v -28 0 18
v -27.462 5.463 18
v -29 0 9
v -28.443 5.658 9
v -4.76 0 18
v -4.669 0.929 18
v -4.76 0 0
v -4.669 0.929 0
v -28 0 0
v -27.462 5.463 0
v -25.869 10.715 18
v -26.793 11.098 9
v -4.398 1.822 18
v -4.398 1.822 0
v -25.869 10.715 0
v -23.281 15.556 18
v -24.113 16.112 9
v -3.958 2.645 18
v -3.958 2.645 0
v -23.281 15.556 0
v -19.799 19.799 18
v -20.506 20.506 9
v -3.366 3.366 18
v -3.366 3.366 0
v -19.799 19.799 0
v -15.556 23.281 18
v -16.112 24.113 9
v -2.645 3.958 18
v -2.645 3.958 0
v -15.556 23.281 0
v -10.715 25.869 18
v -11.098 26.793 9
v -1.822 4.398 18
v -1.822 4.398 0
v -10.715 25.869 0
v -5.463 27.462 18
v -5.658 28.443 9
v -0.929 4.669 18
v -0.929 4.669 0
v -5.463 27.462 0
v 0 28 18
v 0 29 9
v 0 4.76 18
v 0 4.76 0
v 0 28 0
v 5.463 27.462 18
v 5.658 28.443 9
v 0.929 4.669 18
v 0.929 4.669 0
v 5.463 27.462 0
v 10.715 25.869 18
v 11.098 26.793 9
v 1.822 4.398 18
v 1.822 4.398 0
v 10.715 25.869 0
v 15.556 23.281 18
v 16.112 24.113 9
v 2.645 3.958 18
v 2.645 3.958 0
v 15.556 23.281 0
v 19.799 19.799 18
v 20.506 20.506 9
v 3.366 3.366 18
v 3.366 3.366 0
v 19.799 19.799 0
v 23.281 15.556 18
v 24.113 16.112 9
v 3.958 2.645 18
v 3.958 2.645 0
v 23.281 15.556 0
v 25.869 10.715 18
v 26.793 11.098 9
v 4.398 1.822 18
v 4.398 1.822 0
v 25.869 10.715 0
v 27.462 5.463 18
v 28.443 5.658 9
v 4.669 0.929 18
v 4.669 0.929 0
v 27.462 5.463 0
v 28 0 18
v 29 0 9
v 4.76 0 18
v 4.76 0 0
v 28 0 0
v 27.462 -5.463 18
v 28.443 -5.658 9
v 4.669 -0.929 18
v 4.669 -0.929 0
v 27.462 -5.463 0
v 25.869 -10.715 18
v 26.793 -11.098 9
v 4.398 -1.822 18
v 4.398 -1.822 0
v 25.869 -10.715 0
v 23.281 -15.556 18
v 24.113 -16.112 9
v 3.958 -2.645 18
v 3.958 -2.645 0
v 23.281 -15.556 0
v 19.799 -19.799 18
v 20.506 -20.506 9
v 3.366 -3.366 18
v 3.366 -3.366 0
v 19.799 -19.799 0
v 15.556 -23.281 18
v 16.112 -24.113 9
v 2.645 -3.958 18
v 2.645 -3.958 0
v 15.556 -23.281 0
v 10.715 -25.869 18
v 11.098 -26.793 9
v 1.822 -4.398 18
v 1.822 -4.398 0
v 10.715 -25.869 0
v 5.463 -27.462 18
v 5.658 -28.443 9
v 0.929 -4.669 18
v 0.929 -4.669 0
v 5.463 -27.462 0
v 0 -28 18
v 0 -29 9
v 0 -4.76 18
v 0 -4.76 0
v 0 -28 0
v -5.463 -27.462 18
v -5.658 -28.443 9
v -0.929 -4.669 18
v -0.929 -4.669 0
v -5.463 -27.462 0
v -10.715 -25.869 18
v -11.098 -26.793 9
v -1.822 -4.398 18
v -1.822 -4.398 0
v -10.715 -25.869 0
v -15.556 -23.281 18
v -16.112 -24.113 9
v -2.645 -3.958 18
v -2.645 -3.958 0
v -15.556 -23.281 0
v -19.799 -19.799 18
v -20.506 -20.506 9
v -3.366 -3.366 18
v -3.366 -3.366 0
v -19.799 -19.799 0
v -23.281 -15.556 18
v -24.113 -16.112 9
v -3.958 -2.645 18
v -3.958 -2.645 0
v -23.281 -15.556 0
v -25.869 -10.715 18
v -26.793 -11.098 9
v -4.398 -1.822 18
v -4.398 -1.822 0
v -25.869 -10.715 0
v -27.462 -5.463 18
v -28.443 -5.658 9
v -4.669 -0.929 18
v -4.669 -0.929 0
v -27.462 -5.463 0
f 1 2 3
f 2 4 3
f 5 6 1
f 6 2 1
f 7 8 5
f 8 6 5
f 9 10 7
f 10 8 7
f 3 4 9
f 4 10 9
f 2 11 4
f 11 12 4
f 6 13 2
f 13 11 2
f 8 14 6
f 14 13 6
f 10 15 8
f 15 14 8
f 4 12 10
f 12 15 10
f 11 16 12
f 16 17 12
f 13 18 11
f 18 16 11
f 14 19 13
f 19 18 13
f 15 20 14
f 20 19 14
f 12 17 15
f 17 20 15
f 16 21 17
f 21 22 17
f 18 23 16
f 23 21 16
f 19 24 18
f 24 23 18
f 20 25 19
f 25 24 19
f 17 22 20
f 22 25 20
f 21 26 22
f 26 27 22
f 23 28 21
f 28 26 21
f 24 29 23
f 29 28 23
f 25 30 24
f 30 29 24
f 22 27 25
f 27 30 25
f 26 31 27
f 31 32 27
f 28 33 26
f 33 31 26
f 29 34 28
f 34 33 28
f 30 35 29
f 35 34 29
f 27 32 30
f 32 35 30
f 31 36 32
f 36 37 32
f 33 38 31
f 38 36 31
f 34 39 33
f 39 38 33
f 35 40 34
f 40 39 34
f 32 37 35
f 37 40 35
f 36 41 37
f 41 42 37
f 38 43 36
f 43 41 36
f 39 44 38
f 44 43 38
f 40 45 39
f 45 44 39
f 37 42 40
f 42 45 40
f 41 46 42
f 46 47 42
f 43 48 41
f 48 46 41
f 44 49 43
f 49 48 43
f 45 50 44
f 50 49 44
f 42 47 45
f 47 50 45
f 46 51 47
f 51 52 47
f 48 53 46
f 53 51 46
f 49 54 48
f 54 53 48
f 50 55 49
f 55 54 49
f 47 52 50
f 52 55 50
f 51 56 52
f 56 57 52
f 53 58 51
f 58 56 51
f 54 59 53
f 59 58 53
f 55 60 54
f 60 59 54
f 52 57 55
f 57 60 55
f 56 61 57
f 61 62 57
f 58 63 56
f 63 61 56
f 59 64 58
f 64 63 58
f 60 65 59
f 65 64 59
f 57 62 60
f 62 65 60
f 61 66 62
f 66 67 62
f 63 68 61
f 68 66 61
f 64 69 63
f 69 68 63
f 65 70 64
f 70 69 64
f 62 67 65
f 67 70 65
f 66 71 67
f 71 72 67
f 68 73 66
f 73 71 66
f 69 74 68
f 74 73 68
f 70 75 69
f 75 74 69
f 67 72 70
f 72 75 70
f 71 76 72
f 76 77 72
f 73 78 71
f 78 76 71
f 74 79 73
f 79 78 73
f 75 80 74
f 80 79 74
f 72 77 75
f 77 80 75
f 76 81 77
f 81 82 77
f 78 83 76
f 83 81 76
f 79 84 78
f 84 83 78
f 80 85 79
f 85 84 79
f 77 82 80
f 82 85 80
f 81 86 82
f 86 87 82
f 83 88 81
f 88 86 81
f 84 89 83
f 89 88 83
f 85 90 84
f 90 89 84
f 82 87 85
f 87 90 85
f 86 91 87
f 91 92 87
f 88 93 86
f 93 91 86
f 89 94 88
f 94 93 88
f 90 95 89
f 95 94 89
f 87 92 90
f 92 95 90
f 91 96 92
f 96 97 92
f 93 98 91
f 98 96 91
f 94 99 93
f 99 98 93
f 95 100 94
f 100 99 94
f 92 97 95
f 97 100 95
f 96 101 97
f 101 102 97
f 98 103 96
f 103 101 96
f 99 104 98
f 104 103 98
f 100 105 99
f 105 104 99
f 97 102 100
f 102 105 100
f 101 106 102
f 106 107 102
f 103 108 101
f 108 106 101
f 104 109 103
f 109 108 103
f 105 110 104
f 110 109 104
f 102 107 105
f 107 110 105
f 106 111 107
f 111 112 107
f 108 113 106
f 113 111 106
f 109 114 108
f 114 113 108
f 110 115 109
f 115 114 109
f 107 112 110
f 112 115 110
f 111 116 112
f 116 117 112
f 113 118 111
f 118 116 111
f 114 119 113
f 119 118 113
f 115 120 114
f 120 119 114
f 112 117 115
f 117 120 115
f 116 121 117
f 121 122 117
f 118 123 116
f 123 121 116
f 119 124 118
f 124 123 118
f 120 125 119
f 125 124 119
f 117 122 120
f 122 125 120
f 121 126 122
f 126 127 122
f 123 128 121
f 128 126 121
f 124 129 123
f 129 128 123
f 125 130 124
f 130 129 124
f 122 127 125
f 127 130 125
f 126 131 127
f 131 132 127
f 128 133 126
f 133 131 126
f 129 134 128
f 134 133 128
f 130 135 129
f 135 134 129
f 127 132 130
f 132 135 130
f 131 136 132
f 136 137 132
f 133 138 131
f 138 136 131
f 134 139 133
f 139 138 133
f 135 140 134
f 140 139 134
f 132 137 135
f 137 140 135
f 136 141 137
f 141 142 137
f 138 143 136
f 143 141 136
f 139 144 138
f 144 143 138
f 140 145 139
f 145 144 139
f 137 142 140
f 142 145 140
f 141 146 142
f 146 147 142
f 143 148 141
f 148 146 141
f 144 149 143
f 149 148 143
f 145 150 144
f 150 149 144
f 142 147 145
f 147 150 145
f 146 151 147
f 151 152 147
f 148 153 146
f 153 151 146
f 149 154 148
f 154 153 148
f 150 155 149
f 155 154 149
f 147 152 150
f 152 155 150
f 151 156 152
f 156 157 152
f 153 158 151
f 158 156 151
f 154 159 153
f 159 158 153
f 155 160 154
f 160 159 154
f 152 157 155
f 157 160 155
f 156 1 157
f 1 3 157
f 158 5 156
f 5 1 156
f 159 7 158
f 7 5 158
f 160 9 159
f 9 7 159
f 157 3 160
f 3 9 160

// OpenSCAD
$fn = 32;

// ----------------------------------------------------------------------
// Belt roller: 56 mm barrel, 18 mm wide, bore 9.52 mm
// ----------------------------------------------------------------------

// --- parameters (mm) ---
bore_d = 9.52;            // bore
barrel_d = 56;            // barrel diameter
roller_w = 18;            // roller width
crown = 1;                // crown height at mid width

roller_profile = [[4.76, 0], [28, 0], [29, 9], [28, 18], [4.76, 18]];

/* the profile stays clear of the axis, so the bore comes out of the revolve */
rotate_extrude() polygon(roller_profile);
